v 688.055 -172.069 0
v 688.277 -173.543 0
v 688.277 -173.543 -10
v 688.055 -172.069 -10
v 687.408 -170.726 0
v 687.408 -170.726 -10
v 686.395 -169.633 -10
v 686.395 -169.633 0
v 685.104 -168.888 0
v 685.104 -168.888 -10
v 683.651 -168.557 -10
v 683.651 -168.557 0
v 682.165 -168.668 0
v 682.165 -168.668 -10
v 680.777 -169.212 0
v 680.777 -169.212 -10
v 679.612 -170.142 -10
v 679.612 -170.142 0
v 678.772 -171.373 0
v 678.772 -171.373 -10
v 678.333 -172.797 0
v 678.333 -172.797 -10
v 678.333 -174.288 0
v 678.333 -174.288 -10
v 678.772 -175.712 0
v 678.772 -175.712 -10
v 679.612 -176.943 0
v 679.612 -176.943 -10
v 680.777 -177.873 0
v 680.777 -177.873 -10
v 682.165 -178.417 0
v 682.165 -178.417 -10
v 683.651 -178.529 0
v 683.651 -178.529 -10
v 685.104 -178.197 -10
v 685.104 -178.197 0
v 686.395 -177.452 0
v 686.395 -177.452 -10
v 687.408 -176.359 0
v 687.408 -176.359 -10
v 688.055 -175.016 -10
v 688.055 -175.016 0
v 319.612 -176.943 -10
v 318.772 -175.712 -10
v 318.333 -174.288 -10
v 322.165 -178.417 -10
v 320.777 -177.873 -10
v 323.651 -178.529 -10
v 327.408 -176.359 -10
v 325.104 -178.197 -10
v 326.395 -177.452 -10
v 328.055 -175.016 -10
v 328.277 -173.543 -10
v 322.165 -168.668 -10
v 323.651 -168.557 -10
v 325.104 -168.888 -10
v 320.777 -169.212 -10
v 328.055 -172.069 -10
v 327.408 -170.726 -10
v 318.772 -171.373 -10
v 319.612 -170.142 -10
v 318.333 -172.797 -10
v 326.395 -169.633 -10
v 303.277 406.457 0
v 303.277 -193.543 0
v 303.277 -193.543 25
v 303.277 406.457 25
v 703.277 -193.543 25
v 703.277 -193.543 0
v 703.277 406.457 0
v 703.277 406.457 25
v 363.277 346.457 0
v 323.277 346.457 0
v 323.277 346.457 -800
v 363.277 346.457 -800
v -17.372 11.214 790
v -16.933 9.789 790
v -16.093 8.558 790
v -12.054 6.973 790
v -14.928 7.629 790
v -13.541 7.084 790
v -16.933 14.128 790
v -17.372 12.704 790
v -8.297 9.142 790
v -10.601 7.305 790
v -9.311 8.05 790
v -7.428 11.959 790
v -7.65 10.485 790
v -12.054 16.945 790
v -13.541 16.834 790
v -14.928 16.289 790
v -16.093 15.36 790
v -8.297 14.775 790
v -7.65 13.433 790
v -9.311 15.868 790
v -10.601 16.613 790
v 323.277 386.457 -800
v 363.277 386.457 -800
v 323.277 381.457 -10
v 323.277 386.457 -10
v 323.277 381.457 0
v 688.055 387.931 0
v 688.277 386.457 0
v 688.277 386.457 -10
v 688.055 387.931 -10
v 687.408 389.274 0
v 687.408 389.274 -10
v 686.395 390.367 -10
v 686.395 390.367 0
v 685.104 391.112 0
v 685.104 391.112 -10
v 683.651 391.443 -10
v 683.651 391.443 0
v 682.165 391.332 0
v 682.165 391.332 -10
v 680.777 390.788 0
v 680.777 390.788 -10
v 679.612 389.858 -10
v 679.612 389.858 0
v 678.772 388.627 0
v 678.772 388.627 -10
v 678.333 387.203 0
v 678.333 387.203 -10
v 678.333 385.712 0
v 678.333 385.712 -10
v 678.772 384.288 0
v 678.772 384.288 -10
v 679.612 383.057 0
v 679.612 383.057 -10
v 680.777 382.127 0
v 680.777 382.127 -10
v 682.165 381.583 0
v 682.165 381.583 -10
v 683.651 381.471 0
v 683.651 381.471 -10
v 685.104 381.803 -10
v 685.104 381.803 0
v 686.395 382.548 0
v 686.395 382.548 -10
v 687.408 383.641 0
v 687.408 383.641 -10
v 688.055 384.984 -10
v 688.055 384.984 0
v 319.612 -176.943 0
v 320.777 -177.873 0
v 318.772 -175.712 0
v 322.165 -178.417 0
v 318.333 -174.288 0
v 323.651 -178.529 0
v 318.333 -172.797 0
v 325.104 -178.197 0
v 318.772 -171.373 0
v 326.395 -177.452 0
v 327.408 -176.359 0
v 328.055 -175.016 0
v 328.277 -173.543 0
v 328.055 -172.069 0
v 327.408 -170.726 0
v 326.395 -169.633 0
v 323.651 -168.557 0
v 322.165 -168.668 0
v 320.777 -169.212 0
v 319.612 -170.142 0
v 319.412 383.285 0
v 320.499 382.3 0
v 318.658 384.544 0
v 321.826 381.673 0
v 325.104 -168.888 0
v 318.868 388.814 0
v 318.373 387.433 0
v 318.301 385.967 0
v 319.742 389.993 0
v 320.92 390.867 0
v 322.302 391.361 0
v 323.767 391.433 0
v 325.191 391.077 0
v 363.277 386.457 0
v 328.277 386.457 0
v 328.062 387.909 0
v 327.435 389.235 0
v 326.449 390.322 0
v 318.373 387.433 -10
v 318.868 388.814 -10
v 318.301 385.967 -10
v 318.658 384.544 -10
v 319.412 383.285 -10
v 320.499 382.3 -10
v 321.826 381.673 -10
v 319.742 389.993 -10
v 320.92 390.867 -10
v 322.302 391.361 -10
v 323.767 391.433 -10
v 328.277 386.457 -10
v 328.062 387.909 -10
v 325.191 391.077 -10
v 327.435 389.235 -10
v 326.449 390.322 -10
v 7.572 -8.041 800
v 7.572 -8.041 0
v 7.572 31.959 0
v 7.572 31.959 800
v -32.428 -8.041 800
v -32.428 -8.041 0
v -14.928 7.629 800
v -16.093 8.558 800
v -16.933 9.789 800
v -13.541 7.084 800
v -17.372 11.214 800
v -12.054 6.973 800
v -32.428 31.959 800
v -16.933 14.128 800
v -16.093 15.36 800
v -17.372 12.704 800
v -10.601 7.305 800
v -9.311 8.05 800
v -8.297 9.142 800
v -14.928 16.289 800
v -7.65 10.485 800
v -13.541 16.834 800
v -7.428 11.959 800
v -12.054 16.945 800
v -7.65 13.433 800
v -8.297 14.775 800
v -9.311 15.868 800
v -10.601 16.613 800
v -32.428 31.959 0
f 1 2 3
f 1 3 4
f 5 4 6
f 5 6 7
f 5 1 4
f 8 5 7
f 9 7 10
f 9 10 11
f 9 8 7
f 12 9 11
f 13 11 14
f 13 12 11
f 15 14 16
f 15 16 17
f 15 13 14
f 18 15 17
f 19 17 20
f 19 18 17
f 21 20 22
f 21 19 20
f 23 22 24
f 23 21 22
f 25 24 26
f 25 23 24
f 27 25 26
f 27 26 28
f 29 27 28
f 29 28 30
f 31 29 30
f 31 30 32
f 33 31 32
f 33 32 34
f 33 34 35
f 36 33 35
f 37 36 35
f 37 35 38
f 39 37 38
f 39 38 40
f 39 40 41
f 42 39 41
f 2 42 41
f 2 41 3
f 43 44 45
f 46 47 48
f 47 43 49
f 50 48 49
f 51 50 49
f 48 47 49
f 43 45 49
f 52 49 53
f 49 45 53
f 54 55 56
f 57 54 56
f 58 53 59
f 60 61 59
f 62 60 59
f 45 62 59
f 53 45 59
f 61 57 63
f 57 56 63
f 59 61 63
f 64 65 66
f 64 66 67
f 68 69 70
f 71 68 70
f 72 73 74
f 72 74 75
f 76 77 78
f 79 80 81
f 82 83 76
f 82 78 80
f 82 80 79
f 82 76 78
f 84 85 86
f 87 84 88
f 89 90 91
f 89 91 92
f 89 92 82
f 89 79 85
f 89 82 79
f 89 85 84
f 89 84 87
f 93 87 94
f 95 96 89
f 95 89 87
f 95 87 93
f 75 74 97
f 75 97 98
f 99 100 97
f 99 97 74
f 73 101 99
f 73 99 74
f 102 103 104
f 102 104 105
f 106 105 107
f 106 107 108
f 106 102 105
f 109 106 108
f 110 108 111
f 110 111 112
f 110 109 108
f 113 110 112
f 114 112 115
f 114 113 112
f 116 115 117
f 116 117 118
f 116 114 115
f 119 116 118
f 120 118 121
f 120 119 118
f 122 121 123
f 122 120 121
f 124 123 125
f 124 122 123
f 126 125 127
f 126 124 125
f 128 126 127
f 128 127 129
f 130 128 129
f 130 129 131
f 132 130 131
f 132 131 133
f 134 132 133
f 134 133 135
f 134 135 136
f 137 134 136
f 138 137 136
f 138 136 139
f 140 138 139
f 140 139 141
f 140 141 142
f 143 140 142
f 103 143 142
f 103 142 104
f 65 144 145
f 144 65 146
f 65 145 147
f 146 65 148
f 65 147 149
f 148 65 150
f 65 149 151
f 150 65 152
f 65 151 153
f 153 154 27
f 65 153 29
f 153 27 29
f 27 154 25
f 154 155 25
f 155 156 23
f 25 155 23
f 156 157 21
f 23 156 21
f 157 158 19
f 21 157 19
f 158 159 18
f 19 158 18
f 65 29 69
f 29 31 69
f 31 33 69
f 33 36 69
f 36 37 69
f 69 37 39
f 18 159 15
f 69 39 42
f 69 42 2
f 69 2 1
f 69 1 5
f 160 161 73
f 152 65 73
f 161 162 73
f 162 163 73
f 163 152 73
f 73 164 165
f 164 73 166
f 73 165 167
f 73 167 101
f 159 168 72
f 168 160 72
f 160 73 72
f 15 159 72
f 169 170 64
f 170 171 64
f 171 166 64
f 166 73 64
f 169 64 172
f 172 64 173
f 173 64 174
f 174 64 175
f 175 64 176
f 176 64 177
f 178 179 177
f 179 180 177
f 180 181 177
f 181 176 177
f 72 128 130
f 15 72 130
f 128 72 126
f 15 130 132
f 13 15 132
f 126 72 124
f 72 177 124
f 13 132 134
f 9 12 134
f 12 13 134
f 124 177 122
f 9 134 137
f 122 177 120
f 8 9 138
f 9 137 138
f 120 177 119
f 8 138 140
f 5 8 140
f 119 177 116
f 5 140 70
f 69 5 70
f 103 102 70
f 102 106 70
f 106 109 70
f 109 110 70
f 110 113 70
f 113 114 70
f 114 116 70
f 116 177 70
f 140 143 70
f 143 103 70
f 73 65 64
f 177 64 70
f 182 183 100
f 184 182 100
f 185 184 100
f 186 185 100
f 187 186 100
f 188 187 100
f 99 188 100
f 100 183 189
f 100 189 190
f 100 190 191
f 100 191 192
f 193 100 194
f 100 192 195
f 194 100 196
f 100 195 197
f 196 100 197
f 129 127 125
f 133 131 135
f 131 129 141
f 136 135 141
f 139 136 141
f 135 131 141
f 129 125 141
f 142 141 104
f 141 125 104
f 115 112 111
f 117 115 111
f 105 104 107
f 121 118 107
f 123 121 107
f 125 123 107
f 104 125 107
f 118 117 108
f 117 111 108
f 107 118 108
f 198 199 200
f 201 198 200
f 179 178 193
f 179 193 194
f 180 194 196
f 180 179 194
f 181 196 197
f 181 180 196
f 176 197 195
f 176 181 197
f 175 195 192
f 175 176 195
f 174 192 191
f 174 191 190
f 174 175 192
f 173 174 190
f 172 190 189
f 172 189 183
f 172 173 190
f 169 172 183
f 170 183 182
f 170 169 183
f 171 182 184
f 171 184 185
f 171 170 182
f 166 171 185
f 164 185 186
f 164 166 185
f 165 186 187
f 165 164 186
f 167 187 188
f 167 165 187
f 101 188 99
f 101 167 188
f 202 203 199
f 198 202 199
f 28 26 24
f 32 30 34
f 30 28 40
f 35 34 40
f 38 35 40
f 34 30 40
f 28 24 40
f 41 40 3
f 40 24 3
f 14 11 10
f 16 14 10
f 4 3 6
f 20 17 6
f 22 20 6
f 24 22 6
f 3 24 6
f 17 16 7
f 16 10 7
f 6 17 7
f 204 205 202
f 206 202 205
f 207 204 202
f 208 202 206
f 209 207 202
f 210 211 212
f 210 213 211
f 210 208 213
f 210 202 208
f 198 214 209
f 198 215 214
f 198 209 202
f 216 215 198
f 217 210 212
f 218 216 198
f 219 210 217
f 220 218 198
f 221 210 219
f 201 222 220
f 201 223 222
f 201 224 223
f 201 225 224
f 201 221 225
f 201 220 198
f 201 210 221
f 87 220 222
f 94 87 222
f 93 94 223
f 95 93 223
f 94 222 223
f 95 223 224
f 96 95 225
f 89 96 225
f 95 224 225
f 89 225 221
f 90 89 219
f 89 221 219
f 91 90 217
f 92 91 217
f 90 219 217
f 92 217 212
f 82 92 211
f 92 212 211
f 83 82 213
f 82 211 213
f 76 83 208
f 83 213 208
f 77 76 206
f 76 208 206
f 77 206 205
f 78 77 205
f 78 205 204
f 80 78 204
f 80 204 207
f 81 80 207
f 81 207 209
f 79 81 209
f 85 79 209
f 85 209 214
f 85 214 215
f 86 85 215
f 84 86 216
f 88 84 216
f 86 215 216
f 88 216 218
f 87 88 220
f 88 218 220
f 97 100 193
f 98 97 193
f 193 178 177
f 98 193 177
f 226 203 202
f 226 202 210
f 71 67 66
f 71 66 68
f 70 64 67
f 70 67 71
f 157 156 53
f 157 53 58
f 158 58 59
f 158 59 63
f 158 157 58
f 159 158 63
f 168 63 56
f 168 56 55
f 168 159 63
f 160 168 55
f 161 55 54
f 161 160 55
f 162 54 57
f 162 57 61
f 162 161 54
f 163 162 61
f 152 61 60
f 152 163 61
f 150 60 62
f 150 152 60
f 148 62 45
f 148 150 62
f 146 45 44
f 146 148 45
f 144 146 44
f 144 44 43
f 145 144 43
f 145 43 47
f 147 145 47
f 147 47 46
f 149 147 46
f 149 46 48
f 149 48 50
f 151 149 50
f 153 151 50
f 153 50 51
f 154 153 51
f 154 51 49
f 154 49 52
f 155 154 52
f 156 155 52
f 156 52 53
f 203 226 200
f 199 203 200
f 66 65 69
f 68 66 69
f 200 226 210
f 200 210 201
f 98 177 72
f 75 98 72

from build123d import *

# Parameters (mm, degrees)
F0_W     = 40
F0_H     = 40
F1_DEPTH = 800
F2_W     = 400
F2_H     = 600
F3_DEPTH = 25
F4_R     = 5
F5_DEPTH = 35
F6_R     = 5
F7_DEPTH = 10
F8_W     = 40
F8_H     = 40
F9_DEPTH = 800


with BuildPart() as f1:
    # F0 (on Top) → F1 (new body)
    with BuildSketch(Plane.XY):
        with Locations((-12.428137, 11.958888)):
            Rectangle(F0_W, F0_H)
    extrude(amount=F1_DEPTH)

    # F6 (on face) → F7 (cut)
    with BuildSketch(Plane.XY.offset(800)):
        with Locations((-12.428137, 11.958888)):
            Circle(F6_R)
    extrude(amount=-F7_DEPTH, mode=Mode.SUBTRACT)


with BuildPart() as f3:
    # F2 (on Top) → F3 (new body)
    with BuildSketch(Plane.XY):
        with Locations((503.277305, 106.457415)):
            Rectangle(F2_W, F2_H)
    extrude(amount=F3_DEPTH)

    # F4 (on face) → F5 (join)
    with BuildSketch(Plane.XY.offset(25)):
        with Locations((323.277305, -173.542585)):
            Circle(F4_R)
        with Locations((683.277305, -173.542585)):
            Circle(F4_R)
        with Locations((323.277305, 386.457415)):
            Circle(F4_R)
        with Locations((683.277305, 386.457415)):
            Circle(F4_R)
    extrude(amount=-F5_DEPTH)

    # F8 (on face) → F9 (join)
    with BuildSketch(Plane(origin=(0, 0, 0), x_dir=(1, 0, 0), z_dir=(0, 0, -1))):
        with Locations((343.277305, -366.457415)):
            Rectangle(F8_W, F8_H)
    extrude(amount=F9_DEPTH)


solid = Compound([f1.part, f3.part])
